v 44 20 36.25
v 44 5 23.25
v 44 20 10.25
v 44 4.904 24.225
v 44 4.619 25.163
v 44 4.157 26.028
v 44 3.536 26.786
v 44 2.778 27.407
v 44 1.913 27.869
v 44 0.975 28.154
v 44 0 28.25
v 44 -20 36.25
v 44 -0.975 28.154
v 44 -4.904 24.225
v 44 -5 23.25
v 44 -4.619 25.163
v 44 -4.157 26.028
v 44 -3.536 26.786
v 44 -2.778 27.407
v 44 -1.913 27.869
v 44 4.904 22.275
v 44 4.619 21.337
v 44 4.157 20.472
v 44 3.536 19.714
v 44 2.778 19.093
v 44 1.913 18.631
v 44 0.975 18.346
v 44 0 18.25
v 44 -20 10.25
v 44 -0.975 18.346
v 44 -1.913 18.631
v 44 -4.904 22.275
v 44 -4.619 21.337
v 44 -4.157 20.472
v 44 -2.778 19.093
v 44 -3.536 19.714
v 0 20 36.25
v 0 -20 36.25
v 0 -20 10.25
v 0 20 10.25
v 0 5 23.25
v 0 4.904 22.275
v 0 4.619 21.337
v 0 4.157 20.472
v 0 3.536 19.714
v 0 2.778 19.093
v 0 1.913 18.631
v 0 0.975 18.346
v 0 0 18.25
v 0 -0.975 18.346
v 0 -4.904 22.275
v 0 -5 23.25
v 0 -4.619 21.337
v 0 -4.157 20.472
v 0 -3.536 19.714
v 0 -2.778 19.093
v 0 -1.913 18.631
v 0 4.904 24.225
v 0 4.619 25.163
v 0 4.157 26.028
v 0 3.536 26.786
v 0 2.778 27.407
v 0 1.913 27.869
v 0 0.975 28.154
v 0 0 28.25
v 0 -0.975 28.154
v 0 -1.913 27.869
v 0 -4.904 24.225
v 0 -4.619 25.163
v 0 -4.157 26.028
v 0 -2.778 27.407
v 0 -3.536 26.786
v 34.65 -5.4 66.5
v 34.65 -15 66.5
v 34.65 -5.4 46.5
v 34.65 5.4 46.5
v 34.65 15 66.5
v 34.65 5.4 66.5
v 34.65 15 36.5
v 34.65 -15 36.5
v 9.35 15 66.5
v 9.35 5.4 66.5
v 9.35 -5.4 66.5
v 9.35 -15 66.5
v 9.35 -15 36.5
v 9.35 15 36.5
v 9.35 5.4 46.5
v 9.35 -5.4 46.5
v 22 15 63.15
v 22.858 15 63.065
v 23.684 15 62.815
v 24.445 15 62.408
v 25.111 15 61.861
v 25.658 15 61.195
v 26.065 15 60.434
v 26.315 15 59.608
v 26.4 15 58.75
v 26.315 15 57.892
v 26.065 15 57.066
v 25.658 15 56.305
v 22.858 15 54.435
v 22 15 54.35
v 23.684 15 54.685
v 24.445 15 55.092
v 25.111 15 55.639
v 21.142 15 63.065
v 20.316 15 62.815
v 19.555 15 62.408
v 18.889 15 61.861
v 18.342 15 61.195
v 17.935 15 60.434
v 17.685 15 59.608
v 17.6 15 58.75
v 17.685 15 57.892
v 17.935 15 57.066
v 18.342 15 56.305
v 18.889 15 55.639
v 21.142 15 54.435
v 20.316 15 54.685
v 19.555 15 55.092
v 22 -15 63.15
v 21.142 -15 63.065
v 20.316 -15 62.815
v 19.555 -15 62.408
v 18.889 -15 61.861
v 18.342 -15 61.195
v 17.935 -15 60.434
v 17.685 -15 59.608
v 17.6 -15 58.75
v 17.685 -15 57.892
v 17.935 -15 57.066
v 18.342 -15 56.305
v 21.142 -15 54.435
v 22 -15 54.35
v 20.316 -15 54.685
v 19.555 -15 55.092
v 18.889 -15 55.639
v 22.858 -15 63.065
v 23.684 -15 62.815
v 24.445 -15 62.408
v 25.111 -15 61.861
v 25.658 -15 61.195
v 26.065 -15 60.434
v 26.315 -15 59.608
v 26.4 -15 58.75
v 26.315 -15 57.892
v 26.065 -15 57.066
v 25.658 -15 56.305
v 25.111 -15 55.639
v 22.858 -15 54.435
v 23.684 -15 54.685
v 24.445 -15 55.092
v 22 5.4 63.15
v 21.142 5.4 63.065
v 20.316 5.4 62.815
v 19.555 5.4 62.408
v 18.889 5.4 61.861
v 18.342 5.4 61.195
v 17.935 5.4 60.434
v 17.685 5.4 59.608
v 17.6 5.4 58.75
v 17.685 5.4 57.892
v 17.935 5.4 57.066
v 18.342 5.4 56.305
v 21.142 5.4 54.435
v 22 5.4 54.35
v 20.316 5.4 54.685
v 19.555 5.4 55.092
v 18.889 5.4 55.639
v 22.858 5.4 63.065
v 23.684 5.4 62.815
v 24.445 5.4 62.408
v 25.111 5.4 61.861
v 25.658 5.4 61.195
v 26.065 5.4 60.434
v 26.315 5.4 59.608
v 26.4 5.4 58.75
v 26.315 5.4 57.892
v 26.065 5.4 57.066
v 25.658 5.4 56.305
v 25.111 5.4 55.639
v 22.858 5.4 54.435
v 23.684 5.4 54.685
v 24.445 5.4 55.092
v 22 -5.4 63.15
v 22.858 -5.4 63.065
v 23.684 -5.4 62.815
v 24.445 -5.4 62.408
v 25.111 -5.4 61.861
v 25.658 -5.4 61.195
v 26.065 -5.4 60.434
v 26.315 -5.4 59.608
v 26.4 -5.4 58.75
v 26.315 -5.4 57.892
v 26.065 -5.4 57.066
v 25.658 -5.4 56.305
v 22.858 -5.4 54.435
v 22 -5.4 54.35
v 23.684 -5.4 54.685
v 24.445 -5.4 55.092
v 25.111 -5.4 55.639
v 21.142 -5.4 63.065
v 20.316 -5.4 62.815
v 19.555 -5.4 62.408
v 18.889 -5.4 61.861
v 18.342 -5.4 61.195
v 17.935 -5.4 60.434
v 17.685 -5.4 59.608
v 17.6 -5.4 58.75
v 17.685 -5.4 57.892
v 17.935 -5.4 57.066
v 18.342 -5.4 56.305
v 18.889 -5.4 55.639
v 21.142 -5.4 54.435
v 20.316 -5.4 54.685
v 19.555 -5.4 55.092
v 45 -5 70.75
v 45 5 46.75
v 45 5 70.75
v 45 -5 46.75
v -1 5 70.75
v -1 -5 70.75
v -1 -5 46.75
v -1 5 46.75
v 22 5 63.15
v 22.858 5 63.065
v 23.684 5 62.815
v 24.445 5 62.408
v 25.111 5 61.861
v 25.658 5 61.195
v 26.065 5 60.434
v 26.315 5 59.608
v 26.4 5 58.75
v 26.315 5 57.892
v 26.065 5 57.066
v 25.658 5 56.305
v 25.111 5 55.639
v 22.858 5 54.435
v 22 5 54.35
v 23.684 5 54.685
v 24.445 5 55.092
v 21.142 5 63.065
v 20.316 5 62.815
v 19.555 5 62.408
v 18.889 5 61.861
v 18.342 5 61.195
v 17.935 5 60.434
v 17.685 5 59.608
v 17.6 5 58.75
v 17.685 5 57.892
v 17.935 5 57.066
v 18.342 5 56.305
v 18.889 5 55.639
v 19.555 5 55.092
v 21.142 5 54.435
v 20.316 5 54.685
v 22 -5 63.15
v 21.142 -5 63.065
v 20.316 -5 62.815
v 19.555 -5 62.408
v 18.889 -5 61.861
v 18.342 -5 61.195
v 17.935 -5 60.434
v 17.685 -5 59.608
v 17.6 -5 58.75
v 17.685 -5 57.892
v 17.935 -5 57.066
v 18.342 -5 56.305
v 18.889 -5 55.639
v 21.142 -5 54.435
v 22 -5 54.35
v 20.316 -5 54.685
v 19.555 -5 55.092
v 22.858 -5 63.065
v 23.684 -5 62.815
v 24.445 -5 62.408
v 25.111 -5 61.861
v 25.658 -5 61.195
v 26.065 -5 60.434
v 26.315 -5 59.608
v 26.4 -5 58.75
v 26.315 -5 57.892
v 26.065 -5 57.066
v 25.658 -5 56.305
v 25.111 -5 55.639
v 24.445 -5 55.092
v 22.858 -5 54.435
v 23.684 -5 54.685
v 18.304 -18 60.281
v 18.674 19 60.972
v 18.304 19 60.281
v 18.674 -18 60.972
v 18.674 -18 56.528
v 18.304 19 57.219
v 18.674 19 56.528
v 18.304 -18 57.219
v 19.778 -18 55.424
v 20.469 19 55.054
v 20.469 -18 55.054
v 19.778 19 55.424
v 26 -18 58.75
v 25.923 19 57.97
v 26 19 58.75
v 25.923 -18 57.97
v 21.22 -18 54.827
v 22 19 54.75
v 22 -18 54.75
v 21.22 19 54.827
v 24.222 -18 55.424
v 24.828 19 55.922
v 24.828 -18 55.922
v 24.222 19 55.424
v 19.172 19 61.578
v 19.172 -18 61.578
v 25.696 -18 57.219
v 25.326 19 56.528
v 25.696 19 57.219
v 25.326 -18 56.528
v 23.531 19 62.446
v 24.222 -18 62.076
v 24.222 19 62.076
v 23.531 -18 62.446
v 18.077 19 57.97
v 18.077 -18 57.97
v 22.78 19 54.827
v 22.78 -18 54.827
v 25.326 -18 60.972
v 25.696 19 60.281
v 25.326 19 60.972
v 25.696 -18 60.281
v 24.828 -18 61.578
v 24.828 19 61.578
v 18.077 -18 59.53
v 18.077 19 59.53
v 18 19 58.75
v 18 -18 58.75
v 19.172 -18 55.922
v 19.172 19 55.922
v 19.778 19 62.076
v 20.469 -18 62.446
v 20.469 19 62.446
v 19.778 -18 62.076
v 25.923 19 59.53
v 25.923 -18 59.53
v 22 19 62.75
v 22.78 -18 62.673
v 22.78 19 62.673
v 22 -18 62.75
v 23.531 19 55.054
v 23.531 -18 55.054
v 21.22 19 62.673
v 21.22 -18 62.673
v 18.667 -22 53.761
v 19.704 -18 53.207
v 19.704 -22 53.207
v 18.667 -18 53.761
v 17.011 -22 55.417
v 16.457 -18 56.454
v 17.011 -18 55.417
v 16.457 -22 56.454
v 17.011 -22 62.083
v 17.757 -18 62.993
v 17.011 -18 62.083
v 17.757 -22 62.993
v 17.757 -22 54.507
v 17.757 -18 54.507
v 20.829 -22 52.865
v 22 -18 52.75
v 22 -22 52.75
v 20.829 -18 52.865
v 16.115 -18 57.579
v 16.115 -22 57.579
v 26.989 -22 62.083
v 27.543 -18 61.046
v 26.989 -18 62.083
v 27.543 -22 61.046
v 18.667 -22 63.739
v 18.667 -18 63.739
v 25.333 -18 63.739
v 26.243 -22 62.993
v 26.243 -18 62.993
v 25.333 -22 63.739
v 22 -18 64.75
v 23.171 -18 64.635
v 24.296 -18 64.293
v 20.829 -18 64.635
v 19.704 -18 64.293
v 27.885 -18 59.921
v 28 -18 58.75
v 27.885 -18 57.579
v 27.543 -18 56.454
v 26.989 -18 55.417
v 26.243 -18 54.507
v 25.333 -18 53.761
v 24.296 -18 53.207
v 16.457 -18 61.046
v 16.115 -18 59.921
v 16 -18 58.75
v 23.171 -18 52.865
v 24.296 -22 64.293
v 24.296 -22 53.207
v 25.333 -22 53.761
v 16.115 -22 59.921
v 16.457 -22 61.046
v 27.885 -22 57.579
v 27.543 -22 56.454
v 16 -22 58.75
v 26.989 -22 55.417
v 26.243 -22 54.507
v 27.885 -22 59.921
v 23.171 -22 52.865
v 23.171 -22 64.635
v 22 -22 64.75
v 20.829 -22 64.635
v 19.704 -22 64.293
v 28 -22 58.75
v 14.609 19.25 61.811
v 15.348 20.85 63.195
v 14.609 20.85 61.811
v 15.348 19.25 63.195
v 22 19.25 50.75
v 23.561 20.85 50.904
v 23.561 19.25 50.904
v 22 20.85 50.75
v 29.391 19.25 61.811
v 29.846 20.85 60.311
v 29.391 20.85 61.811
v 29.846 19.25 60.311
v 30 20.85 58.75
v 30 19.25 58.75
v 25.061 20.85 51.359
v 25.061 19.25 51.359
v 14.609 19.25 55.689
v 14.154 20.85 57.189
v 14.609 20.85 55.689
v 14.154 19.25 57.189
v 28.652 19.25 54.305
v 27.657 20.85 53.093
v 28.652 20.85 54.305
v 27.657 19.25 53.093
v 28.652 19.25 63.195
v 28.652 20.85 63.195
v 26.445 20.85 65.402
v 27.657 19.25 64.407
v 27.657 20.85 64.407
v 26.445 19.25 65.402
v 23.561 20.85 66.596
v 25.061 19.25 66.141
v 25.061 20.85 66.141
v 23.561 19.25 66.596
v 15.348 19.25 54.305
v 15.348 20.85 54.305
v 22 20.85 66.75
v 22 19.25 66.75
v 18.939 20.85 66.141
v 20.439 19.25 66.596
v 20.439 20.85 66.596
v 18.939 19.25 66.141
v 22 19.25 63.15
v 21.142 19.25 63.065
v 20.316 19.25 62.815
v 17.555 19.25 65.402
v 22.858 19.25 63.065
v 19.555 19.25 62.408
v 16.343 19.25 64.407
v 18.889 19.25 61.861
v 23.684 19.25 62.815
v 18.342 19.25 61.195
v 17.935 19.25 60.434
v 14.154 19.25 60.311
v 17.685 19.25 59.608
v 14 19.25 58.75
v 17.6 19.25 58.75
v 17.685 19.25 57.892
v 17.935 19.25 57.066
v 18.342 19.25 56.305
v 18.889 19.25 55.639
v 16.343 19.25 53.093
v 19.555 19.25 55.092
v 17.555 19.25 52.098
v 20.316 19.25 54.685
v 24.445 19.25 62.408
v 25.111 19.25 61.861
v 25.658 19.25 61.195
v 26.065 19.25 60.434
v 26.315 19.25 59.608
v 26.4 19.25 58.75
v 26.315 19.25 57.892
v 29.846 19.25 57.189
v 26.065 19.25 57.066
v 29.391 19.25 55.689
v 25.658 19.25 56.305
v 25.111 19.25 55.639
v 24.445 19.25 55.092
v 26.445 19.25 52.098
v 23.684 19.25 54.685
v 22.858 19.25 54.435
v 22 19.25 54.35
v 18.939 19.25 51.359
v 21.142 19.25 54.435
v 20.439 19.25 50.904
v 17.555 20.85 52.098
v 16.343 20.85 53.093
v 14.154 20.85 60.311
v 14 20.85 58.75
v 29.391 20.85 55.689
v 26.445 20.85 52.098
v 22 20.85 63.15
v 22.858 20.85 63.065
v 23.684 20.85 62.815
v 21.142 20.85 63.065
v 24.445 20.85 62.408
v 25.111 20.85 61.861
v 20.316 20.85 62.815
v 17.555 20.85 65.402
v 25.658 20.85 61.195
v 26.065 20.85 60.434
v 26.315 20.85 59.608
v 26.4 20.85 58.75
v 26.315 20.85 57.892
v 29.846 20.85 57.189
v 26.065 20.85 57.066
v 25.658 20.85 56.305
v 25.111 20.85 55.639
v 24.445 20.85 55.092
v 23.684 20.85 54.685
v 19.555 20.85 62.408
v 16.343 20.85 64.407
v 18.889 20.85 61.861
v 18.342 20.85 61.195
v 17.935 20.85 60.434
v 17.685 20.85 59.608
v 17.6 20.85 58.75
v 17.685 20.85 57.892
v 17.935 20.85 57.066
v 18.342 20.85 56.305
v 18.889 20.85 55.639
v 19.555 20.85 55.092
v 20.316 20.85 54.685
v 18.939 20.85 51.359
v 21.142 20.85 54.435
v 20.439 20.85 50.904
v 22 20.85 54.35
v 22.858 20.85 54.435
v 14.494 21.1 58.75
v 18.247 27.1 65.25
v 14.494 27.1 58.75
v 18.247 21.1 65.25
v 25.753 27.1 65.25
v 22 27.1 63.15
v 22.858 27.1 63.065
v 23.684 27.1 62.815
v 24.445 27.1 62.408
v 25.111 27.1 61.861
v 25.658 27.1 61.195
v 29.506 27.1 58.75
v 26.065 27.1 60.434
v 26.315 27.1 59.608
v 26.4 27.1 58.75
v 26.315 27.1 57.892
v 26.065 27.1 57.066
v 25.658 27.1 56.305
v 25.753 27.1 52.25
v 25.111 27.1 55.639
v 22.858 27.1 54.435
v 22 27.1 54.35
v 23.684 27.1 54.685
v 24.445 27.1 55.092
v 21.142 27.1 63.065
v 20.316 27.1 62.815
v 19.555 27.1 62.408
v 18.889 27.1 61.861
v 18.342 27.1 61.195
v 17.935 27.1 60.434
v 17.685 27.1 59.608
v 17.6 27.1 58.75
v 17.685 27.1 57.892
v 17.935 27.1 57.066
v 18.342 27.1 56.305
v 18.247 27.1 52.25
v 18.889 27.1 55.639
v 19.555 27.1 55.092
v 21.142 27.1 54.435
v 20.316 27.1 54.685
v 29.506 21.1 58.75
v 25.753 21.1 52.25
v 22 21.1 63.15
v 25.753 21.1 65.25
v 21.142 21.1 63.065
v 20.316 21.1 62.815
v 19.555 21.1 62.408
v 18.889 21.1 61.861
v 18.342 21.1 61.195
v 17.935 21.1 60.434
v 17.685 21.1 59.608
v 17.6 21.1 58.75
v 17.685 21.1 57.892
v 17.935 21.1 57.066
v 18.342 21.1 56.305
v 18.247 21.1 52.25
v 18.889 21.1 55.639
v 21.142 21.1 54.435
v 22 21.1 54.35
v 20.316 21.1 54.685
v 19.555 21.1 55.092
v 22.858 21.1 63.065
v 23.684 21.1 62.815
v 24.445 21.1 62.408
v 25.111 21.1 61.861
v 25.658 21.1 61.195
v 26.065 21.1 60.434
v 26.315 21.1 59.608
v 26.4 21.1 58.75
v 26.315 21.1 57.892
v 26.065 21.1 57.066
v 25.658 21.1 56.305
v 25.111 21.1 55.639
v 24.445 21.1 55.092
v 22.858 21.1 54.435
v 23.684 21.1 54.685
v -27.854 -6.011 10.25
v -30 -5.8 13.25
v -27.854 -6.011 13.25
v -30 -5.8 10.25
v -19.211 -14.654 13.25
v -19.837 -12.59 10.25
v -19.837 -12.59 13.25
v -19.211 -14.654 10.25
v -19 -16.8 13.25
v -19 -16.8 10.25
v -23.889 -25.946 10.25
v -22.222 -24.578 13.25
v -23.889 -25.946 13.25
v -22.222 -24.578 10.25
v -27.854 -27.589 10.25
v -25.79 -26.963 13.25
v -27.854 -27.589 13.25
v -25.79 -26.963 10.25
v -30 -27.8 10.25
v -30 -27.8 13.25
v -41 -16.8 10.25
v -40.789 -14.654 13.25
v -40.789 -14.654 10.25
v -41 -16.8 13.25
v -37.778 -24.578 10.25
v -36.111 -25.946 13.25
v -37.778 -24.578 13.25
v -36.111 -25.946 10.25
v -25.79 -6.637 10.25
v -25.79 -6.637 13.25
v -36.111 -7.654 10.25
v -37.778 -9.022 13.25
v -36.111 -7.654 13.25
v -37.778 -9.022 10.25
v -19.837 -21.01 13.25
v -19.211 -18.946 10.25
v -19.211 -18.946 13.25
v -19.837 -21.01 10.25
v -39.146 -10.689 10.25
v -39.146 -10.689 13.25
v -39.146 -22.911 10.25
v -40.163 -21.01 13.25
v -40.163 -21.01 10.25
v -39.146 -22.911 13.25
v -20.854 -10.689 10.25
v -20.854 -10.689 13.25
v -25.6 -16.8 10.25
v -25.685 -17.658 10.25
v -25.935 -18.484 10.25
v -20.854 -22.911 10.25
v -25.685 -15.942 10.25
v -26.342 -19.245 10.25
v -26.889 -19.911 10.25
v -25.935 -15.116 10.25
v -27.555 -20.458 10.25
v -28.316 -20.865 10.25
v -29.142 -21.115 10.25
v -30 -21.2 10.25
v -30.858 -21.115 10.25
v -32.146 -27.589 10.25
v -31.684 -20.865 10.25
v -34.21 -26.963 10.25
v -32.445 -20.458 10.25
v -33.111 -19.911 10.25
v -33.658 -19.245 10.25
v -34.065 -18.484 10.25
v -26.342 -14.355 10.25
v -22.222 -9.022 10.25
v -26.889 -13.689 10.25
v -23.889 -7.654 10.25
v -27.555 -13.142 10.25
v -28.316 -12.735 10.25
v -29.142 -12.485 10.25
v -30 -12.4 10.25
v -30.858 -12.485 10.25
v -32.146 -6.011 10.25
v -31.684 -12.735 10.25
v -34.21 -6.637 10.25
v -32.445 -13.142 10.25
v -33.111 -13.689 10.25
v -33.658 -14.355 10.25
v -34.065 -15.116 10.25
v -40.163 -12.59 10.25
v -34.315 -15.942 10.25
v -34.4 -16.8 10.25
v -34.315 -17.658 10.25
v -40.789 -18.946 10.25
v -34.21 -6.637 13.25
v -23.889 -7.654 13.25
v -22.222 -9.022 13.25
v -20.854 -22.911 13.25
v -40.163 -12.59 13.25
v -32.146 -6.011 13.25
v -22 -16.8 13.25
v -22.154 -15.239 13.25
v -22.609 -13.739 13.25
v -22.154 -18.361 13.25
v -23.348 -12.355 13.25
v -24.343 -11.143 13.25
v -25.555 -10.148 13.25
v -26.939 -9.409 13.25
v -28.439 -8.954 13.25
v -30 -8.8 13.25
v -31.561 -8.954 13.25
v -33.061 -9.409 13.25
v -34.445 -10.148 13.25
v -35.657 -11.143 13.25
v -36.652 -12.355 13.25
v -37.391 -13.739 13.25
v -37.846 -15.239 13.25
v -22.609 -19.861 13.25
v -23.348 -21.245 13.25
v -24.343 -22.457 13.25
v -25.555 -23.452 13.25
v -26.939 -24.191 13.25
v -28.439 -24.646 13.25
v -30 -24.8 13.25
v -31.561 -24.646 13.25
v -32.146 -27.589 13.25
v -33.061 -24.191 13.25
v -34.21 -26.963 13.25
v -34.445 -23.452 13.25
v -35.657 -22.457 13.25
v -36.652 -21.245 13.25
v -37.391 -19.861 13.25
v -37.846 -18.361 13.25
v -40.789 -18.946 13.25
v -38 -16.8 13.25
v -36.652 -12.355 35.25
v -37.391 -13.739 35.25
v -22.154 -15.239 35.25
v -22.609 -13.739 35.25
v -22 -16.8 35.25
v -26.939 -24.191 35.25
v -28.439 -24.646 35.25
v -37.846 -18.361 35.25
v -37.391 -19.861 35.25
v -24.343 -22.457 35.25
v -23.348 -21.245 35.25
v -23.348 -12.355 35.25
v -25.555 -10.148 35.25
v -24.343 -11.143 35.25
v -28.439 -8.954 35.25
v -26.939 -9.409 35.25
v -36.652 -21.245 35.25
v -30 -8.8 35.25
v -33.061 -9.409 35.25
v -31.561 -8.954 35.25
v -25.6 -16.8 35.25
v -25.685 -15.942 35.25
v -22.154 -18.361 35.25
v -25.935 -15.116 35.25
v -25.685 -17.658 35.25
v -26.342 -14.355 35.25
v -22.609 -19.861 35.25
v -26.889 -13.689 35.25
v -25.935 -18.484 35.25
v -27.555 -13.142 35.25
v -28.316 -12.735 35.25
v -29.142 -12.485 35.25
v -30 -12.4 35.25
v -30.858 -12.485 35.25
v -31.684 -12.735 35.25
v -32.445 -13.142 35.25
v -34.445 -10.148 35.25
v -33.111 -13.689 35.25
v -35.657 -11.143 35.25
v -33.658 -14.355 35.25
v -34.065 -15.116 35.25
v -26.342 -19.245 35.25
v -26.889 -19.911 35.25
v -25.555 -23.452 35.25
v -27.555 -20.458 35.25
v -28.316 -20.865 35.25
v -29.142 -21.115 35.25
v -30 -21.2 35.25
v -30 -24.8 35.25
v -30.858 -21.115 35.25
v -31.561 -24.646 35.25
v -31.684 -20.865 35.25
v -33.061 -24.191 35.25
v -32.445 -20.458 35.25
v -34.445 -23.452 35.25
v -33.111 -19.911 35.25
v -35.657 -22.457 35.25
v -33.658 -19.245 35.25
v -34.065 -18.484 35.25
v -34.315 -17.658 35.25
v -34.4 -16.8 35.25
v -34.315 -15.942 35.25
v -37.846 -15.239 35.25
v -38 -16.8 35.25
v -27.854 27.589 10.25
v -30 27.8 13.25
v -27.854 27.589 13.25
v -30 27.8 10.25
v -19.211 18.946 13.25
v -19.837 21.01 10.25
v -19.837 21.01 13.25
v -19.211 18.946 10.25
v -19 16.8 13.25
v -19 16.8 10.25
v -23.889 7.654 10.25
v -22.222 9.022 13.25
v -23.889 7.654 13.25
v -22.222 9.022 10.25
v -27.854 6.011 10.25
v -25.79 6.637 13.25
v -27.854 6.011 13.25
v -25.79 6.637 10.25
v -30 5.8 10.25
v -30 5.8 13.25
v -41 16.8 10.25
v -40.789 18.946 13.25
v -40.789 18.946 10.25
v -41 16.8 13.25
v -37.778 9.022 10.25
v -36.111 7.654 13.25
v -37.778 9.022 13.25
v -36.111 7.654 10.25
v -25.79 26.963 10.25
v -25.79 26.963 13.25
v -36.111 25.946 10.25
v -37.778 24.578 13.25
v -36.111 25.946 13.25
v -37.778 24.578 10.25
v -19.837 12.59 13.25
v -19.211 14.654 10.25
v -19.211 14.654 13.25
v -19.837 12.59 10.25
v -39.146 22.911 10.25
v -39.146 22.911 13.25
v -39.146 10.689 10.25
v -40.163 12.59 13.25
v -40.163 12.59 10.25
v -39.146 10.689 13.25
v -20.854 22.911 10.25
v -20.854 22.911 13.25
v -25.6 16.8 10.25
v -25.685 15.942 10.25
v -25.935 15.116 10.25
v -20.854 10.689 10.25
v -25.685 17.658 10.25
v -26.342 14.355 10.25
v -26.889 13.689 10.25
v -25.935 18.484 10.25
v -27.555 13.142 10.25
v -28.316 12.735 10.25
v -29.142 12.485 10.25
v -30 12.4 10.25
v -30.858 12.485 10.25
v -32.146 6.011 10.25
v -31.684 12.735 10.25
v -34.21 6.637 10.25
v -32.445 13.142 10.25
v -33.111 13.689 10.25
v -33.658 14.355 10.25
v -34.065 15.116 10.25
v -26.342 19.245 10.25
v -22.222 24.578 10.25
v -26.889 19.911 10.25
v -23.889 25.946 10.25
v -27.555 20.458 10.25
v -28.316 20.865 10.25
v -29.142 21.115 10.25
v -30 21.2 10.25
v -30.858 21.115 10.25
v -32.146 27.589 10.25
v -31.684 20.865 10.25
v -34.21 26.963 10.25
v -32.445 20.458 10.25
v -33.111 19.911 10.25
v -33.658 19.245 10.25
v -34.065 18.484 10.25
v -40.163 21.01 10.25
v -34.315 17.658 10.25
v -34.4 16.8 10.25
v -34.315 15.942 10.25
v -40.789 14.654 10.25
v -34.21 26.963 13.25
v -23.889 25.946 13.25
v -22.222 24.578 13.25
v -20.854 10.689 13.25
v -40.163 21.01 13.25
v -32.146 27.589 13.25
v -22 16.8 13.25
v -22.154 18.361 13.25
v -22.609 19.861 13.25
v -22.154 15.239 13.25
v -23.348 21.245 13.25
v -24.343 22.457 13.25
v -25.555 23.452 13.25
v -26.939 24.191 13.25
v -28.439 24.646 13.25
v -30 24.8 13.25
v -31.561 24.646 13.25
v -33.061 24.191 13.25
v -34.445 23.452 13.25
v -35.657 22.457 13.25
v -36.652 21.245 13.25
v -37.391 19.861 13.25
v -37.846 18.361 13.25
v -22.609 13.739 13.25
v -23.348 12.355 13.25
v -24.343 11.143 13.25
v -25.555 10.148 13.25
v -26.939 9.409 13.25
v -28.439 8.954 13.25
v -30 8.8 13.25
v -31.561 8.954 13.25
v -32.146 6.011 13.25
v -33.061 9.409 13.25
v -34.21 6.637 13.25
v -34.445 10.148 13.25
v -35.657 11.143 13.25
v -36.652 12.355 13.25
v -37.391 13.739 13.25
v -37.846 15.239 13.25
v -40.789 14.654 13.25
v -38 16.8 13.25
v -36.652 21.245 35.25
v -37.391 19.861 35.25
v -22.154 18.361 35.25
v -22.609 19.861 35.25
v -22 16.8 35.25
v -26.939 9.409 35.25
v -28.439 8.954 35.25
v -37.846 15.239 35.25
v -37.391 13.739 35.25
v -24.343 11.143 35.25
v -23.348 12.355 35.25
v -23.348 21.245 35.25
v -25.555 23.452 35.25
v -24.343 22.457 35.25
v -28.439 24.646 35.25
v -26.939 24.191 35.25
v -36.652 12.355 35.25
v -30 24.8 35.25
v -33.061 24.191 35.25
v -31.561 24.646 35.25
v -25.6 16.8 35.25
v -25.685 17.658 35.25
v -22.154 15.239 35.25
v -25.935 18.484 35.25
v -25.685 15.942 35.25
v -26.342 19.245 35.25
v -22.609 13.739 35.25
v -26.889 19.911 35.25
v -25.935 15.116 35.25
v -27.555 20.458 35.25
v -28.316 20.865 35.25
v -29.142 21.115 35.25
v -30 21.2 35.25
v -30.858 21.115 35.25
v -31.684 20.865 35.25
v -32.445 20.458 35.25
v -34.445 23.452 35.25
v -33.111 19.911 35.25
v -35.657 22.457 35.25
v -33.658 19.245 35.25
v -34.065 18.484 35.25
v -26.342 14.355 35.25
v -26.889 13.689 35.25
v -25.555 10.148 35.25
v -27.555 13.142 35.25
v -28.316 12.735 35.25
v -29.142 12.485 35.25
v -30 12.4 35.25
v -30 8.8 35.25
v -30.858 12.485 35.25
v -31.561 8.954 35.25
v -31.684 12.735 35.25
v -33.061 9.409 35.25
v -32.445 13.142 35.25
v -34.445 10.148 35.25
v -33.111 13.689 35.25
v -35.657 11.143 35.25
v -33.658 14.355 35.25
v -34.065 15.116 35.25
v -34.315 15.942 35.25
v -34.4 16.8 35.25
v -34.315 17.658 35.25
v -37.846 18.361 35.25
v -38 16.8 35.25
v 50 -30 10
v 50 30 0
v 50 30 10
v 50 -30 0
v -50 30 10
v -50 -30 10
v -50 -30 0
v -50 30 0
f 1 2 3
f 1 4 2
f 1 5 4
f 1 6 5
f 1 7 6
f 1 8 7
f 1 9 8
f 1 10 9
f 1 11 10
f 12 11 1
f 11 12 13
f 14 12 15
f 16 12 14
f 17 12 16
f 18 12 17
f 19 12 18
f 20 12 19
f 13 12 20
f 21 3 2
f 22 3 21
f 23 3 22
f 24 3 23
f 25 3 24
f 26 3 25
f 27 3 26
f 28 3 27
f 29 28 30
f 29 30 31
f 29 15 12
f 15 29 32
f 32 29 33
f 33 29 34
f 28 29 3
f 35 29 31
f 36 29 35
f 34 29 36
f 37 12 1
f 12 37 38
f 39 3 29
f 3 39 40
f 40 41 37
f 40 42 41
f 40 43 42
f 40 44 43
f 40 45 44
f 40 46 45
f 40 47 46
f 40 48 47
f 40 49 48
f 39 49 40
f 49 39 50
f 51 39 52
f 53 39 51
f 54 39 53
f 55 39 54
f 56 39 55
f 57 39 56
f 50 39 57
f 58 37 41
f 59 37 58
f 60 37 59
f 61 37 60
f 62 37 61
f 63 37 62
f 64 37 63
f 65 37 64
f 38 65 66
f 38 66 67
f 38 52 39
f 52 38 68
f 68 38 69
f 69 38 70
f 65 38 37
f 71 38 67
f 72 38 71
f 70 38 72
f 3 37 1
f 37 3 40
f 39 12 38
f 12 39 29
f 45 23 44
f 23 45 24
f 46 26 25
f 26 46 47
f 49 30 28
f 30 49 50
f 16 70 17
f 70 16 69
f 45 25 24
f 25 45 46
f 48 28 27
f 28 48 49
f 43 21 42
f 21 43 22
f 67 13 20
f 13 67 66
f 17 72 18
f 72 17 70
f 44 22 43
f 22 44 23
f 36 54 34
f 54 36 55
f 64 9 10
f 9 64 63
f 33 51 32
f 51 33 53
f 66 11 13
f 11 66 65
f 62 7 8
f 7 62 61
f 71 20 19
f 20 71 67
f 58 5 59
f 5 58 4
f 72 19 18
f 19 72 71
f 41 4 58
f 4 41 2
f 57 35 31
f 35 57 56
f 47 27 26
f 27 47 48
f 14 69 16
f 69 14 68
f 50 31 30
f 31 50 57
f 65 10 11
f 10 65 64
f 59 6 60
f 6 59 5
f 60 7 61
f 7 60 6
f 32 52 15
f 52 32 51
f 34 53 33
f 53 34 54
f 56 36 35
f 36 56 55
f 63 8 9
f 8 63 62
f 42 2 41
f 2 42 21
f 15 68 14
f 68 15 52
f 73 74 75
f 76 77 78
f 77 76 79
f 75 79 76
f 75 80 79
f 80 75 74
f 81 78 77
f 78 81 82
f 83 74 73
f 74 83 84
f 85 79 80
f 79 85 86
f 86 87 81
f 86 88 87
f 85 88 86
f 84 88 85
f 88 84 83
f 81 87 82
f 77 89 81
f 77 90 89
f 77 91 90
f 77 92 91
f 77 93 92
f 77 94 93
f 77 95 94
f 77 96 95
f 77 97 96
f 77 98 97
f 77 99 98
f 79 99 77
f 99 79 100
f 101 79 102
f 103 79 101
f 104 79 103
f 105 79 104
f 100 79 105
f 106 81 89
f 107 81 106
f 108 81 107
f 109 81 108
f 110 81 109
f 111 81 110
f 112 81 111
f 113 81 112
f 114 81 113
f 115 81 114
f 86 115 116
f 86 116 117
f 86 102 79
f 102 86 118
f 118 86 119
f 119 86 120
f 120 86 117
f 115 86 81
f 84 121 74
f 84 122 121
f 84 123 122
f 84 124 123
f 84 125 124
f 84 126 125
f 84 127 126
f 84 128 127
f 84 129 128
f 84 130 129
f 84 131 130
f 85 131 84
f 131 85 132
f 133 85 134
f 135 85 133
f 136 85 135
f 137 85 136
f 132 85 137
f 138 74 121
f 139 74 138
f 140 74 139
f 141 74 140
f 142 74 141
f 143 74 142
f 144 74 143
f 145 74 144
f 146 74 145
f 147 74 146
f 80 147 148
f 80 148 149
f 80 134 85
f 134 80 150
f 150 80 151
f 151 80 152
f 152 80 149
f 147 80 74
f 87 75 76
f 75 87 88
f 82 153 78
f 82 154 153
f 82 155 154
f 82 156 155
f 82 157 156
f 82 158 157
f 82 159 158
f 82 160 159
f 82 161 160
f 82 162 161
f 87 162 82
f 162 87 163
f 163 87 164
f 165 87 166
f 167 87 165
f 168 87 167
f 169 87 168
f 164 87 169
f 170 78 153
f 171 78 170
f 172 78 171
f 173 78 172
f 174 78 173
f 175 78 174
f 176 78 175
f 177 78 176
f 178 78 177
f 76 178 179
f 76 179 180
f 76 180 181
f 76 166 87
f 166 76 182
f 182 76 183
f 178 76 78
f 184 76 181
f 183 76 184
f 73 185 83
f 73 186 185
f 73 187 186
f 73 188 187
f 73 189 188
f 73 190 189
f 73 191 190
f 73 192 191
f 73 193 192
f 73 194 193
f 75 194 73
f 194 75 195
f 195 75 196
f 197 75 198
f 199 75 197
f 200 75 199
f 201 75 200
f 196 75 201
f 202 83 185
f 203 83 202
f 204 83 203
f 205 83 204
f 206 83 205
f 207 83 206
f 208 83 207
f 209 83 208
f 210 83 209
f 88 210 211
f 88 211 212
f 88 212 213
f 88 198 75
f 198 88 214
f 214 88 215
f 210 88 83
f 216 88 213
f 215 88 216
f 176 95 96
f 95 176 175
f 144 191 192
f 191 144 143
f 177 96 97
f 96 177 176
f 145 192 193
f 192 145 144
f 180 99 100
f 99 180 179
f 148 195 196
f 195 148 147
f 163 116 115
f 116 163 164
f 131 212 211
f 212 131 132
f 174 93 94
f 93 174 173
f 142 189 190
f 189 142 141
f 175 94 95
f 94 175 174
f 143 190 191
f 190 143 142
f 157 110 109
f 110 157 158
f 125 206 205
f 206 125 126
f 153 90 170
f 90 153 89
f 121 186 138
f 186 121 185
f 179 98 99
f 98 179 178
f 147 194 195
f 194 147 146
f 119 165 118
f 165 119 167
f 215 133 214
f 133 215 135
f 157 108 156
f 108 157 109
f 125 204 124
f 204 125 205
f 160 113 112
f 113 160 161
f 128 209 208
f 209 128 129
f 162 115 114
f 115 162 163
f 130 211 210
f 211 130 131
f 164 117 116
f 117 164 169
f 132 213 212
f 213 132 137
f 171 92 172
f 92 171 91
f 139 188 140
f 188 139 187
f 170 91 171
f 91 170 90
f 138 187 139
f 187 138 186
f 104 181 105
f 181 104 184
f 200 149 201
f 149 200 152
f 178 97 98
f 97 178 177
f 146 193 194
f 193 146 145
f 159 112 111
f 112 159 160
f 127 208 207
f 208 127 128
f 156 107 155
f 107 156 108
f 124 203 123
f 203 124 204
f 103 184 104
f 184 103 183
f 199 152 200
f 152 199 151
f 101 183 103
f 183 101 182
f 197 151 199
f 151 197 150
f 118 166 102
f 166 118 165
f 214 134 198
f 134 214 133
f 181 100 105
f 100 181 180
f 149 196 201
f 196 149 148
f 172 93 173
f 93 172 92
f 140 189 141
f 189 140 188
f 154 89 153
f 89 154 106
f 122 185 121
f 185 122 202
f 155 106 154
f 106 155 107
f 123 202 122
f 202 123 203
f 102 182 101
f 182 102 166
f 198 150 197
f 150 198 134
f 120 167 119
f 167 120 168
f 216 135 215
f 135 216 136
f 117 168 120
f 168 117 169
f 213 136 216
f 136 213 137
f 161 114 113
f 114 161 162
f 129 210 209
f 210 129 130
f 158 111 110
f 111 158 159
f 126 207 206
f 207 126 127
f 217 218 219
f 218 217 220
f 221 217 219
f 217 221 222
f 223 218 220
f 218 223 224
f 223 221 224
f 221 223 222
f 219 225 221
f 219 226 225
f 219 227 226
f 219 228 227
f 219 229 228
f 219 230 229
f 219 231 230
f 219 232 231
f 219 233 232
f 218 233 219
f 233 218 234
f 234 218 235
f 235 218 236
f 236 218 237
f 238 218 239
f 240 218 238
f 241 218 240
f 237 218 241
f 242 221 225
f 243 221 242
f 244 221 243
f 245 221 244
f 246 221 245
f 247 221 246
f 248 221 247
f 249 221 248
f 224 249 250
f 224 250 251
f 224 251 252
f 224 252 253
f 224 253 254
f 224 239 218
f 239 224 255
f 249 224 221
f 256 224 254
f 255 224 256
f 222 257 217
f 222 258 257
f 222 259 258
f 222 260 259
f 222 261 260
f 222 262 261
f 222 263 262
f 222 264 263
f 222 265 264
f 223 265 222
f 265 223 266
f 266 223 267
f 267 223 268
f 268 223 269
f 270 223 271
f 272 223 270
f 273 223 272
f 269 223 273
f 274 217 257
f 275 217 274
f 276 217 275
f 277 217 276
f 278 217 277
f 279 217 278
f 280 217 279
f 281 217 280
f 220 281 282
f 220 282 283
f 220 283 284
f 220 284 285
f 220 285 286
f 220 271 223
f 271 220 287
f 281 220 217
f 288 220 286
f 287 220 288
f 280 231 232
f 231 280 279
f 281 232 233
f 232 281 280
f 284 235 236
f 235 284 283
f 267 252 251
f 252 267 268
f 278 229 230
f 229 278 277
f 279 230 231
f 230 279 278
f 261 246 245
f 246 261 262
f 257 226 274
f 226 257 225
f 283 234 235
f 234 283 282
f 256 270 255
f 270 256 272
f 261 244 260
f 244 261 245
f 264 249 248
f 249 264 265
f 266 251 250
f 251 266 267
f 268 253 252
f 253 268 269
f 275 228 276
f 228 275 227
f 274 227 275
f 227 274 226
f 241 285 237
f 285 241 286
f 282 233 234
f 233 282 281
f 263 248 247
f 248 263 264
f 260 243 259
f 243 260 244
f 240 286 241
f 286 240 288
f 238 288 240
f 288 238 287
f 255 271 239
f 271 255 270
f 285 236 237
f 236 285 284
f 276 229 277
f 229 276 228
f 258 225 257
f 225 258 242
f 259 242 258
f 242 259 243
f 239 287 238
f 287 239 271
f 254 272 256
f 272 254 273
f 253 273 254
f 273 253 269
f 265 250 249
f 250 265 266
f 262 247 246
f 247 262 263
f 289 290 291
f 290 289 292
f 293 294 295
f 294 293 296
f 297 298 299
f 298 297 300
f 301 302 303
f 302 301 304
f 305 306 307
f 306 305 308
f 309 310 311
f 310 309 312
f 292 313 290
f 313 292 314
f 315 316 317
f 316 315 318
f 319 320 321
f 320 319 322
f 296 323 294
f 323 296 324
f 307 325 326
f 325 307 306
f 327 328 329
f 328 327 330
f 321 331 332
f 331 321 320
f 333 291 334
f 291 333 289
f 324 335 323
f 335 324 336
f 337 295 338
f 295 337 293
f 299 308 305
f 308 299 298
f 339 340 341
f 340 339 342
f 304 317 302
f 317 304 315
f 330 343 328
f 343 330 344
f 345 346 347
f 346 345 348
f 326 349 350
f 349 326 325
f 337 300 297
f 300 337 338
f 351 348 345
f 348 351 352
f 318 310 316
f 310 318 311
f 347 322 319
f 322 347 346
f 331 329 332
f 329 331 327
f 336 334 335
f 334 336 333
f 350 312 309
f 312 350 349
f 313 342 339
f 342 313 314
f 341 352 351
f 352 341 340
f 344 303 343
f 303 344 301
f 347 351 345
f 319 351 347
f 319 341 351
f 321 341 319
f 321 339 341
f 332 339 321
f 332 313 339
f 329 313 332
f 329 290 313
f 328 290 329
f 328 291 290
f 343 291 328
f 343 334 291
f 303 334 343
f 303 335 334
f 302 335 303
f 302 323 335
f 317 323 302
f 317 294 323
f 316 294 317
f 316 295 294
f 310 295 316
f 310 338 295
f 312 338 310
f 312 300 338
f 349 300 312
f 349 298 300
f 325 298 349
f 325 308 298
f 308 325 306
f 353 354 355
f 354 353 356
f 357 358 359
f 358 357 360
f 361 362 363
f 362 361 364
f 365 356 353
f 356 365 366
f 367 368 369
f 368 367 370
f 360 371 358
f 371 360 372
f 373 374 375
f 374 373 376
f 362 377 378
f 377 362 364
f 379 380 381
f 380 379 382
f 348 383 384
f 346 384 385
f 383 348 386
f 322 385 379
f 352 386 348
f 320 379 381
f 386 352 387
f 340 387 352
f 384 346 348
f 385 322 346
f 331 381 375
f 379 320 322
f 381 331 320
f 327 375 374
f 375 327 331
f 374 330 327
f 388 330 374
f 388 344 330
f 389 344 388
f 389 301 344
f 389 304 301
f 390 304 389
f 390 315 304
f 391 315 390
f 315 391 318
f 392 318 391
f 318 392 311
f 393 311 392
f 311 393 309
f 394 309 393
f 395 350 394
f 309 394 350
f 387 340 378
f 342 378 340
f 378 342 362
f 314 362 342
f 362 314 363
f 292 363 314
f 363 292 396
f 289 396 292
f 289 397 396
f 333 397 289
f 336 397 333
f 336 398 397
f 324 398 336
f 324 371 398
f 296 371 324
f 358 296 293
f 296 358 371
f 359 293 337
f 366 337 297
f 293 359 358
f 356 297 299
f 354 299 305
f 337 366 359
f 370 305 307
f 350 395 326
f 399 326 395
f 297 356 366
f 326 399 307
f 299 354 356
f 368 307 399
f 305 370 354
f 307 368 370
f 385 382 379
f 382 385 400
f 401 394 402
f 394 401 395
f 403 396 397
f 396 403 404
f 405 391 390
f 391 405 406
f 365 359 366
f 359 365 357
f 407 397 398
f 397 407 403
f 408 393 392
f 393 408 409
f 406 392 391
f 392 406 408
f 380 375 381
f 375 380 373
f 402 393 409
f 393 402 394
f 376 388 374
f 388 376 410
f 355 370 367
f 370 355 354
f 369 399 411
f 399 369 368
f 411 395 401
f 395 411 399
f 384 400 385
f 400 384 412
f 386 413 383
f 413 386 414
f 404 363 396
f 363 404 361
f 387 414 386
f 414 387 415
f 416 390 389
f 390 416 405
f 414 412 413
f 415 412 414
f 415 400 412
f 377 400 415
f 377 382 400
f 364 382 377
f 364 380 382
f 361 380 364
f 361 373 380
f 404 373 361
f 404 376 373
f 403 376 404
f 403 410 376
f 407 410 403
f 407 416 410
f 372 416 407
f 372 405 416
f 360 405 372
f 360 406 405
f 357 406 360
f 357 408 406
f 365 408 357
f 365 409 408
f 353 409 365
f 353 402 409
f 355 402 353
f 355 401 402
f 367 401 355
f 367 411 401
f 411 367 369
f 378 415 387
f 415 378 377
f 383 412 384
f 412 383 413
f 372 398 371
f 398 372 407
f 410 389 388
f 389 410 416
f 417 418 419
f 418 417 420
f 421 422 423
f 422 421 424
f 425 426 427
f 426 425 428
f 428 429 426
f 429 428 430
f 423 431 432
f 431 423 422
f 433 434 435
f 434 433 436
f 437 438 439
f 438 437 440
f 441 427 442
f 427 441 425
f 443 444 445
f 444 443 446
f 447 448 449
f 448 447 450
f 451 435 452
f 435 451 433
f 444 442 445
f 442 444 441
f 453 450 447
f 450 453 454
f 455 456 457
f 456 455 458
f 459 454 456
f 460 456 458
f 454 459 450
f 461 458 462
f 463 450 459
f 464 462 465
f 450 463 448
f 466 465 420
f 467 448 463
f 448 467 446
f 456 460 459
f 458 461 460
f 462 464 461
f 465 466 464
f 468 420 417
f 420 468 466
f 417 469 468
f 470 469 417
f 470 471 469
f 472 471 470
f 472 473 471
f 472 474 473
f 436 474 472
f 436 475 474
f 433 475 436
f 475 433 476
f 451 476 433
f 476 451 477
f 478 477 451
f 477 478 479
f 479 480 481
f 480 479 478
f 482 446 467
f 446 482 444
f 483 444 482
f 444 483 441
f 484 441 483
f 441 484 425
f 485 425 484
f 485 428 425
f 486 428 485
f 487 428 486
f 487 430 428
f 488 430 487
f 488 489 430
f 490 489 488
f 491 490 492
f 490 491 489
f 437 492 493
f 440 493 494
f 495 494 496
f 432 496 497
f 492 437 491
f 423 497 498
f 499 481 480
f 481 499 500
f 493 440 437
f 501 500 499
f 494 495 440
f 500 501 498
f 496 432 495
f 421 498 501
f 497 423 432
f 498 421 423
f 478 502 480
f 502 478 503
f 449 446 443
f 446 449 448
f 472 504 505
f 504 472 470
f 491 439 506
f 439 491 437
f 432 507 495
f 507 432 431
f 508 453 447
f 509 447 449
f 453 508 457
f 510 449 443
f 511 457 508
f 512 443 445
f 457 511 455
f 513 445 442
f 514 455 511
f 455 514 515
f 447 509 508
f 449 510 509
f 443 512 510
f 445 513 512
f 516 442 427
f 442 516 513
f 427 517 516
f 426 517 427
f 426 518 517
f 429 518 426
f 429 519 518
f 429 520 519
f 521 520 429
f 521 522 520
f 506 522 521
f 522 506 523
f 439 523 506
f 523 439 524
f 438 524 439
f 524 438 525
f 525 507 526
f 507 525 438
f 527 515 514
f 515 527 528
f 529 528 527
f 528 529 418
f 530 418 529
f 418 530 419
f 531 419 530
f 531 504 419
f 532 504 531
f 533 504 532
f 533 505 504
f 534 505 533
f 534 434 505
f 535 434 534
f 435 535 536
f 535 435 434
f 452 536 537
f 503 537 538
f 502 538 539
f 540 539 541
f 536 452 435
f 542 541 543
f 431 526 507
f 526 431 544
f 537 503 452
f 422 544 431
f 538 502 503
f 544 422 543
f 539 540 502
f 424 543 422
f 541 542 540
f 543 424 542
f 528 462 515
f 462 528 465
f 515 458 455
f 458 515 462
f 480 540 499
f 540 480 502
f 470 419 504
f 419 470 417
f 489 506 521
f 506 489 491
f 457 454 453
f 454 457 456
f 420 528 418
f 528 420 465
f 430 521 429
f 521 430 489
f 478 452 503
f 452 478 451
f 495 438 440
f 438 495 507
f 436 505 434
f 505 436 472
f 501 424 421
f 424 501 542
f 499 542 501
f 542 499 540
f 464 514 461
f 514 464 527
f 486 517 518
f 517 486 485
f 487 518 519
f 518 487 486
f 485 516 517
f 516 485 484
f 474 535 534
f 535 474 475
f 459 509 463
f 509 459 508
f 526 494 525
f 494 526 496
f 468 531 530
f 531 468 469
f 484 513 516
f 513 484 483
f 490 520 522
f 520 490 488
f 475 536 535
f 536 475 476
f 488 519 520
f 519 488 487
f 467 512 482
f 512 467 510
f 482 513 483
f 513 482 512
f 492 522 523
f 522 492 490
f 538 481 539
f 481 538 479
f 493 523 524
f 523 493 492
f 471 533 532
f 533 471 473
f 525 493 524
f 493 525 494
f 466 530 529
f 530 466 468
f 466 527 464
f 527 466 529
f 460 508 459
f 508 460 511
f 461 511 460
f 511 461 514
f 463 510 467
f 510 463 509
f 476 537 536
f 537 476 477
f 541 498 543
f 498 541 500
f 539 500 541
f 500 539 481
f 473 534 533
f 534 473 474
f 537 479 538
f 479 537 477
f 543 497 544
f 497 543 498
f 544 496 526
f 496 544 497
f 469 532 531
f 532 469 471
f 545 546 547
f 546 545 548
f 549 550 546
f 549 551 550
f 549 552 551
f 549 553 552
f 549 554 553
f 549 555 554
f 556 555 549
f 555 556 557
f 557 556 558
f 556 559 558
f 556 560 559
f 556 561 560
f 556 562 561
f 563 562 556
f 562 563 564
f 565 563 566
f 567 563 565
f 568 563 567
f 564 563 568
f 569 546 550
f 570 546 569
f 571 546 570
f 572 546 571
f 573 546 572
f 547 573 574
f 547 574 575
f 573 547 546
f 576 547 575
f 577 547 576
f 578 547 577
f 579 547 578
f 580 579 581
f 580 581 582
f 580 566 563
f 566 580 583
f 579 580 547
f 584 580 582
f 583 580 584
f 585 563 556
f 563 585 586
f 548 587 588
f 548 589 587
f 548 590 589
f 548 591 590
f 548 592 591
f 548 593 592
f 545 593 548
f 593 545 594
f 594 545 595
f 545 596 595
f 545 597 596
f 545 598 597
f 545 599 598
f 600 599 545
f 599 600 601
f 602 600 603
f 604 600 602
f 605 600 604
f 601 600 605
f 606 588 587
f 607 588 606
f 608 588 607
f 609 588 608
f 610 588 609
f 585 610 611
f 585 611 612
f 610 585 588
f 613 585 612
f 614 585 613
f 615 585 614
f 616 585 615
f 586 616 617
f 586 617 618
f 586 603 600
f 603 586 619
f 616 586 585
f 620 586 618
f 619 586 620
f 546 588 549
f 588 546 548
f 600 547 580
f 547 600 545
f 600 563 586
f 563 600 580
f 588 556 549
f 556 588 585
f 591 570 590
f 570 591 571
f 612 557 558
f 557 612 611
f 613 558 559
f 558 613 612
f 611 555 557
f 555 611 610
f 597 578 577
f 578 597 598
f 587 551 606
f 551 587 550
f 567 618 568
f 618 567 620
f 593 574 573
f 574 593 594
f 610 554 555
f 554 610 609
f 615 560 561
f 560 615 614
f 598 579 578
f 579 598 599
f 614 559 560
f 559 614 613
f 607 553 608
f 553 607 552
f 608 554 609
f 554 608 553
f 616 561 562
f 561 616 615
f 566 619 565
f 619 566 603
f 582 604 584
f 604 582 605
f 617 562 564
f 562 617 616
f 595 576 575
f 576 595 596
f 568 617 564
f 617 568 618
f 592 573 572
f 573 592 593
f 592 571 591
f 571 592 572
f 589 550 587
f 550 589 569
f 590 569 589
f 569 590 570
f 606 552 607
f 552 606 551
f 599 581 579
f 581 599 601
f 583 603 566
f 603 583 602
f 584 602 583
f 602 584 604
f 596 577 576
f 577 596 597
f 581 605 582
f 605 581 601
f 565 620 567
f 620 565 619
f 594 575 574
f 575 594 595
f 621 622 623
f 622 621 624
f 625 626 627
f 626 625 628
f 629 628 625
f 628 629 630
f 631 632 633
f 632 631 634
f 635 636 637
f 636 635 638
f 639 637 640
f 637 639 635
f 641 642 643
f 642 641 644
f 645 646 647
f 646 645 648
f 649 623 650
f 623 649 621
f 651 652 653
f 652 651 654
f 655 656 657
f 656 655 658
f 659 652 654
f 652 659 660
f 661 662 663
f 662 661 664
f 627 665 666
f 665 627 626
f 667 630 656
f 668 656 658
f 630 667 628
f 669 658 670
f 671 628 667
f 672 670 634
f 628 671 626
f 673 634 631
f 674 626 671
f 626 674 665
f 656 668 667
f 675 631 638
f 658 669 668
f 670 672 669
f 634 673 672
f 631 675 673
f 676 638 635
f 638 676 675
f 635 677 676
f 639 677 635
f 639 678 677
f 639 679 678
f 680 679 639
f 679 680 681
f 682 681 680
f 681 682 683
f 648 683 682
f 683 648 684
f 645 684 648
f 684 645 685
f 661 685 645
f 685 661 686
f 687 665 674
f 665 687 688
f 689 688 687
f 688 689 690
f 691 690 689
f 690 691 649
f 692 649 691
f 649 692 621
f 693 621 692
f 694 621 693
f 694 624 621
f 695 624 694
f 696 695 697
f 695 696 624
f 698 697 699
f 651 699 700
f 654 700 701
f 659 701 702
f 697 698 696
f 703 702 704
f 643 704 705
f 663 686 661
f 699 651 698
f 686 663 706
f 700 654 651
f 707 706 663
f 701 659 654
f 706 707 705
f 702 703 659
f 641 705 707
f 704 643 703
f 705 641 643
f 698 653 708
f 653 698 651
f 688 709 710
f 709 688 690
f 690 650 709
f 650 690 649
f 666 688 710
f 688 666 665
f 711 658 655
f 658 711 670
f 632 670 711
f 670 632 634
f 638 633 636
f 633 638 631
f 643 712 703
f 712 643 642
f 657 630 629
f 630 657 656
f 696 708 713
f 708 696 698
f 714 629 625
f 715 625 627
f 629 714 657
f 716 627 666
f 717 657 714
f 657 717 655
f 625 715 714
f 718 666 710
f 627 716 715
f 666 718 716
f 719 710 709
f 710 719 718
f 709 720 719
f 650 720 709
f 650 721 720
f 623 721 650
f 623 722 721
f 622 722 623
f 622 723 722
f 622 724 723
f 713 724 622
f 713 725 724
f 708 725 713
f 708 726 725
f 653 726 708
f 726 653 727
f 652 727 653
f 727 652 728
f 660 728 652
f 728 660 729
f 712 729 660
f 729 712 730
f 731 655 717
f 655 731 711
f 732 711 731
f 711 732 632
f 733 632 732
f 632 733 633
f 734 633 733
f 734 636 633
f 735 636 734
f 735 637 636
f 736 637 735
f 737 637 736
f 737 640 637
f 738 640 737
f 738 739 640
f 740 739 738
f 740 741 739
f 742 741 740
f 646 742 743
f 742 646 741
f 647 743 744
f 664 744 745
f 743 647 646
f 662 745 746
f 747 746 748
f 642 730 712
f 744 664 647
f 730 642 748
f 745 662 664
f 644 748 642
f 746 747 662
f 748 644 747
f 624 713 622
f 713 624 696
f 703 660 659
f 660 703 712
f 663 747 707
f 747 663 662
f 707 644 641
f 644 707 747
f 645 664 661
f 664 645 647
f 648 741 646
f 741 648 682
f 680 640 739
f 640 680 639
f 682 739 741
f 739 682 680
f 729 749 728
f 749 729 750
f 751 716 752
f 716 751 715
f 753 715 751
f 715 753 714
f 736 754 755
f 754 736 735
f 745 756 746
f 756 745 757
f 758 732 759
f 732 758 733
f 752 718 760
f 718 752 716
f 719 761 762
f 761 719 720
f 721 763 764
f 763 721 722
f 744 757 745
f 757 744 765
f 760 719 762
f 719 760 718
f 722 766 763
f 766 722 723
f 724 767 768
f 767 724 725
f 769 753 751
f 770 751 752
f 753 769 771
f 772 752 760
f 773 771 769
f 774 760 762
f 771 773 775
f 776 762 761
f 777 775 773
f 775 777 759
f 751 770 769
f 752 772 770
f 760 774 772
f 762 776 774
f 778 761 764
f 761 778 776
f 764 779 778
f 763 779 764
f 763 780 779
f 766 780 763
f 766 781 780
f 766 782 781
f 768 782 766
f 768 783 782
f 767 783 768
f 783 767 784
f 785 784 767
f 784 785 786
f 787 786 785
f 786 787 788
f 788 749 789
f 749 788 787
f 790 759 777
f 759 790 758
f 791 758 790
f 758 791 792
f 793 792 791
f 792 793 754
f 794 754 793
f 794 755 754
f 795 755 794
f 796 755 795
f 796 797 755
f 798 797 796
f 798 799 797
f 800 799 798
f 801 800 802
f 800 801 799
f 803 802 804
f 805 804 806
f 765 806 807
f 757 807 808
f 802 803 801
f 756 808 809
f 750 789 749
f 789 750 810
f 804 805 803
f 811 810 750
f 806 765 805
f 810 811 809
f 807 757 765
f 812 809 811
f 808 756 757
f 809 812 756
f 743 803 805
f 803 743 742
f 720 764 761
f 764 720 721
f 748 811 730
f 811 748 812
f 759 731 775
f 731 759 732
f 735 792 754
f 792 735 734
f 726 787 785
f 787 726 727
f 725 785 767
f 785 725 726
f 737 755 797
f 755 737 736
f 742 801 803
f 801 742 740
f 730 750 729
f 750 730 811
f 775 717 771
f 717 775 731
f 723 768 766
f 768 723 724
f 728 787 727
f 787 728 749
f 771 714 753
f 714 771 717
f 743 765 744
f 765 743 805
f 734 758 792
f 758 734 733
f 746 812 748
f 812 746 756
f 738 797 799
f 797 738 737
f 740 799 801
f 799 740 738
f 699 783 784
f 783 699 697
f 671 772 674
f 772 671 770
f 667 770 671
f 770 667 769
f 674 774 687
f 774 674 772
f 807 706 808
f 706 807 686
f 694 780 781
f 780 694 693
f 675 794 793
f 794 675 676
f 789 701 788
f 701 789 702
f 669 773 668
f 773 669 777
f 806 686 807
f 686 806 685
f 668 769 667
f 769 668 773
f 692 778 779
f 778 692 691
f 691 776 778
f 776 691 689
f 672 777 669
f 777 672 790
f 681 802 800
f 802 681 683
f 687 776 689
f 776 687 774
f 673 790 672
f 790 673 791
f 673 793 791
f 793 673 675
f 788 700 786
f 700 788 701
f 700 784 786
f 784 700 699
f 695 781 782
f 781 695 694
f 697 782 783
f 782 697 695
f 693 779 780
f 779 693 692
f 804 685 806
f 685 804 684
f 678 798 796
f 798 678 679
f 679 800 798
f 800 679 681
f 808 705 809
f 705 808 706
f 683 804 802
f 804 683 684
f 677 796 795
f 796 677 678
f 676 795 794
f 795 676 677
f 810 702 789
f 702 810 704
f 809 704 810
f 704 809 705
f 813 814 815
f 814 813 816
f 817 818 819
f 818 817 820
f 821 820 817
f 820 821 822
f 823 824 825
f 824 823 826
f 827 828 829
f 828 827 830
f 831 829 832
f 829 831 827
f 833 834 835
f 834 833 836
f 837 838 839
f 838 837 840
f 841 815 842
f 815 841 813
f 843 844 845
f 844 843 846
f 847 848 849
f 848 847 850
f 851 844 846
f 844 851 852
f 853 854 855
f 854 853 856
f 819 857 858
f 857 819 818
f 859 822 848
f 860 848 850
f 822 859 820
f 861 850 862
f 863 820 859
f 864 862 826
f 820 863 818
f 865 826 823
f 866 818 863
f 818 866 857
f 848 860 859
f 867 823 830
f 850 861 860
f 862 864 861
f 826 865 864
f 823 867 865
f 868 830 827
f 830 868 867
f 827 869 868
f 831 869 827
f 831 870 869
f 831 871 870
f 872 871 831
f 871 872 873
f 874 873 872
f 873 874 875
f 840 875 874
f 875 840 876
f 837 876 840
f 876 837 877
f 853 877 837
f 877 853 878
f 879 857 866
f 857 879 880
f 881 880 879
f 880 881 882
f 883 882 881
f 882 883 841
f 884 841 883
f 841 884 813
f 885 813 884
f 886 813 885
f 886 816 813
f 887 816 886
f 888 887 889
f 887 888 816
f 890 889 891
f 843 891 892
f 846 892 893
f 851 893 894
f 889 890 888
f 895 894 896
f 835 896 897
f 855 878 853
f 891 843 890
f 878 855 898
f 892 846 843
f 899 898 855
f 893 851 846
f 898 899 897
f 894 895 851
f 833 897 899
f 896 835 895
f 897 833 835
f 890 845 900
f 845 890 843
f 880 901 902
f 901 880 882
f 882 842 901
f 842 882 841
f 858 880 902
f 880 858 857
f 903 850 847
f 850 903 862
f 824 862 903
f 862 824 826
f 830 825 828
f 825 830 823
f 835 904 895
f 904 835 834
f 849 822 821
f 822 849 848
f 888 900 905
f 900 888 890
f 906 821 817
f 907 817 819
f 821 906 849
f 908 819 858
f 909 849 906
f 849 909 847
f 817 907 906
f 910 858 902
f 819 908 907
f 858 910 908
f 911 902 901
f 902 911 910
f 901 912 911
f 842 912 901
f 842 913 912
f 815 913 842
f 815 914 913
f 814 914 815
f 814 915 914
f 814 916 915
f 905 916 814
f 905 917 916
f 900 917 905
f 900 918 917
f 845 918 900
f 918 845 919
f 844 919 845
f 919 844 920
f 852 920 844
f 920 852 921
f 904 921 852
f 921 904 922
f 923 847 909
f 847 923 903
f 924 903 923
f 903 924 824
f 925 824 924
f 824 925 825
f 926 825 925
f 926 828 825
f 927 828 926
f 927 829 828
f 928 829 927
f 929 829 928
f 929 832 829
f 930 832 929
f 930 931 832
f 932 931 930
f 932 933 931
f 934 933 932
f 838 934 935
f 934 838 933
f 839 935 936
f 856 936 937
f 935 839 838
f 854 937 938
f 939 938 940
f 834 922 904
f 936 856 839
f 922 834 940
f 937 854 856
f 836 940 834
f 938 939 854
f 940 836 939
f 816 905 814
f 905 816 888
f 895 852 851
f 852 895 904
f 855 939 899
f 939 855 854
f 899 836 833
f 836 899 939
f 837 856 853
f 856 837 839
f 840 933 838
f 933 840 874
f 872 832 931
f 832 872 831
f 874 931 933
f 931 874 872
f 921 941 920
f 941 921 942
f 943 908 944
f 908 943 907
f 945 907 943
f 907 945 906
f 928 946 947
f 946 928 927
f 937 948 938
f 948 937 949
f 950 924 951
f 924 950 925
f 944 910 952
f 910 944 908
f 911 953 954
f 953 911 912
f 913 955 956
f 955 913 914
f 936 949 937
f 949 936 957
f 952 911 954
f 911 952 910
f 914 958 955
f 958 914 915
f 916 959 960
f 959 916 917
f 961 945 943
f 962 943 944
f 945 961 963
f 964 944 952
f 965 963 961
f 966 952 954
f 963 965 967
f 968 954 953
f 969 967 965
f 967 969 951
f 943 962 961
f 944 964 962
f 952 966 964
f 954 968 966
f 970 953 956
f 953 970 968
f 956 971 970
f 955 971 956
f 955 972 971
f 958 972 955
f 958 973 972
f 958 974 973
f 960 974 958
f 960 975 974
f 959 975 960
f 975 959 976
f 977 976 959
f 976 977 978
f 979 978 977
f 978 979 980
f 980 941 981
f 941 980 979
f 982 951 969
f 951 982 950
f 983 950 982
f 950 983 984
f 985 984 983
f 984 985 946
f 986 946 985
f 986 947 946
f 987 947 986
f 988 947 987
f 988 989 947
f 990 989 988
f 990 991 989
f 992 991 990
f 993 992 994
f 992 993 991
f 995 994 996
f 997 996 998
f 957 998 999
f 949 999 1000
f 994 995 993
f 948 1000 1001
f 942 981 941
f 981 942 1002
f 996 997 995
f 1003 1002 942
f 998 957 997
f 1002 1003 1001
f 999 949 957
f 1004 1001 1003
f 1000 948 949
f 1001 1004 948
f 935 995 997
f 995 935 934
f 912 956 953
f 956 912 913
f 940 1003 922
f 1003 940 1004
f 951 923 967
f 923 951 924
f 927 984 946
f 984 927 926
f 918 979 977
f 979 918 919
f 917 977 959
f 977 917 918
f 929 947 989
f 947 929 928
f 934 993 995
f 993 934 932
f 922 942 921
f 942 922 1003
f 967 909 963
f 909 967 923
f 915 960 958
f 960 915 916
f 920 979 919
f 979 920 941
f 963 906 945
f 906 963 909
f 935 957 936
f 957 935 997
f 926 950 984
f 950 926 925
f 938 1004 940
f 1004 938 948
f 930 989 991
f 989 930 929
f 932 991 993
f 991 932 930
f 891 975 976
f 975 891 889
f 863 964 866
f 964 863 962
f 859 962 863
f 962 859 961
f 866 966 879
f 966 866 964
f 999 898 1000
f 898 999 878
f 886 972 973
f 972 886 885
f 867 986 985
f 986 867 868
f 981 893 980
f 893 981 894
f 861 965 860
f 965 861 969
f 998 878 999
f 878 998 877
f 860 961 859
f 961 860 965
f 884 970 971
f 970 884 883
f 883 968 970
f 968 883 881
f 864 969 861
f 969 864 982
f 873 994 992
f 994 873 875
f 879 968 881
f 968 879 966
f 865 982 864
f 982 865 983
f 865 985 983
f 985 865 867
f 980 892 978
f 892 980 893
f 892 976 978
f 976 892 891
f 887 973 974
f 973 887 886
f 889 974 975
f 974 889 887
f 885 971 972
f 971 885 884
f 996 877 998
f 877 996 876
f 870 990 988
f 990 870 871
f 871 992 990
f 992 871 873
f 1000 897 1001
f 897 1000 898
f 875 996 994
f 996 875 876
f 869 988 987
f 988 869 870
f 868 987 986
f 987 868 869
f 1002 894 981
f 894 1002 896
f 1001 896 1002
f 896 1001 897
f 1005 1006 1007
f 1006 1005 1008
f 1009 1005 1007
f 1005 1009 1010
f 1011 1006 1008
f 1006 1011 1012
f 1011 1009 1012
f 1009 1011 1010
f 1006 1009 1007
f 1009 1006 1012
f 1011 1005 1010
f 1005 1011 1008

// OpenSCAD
$fn = 32;

// ------------------------------------------------------------------------
// Indexing jig: plate 100 x 60 mm, pin d8
// Every part is its own module, assembly() places every instance.
// ------------------------------------------------------------------------

// --- part 1 ---
module jig_plate() {
  difference() {
    translate([-50, -30, 0]) cube([100, 60, 10]);
  }
}

// --- part 2 ---
module locator_block() {
  difference() {
    translate([-22, -20, 0]) cube([44, 40, 26]);
    translate([0, 0, 13]) rotate([0, 90, 0]) cylinder(h = 46, d = 10, center = true);
  }
}

// --- part 3 ---
module index_fork() {
  difference() {
    translate([-12.65, -15, 0]) cube([25.3, 30, 30]);
    translate([-13.65, -5.4, 10]) cube([27.3, 10.8, 21]);
    translate([0, 0, 22.25]) rotate([90, 0, 0]) cylinder(h = 32, d = 8.8, center = true);
  }
}

// --- part 4 ---
module index_arm() {
  difference() {
    translate([-23, -5, 0]) cube([46, 10, 24]);
    translate([0, 0, 12]) rotate([90, 0, 0]) cylinder(h = 12, d = 8.8, center = true);
  }
}

// --- part 5 ---
module index_pin() {
  rotate([0, 90, 0]) cylinder(h = 38, d = 8, center = true);
  translate([-22, 0, 0]) rotate([0, 90, 0]) cylinder(h = 4, d = 12);
}

// --- part 6 ---
module pin_washer() {
  difference() {
      translate([0, 0, 0]) cylinder(h = 1.6, d = 16);
      translate([0, 0, -1]) cylinder(h = 3.6, d = 8.8);
    }
}

// --- part 7 ---
module lock_nut() {
  difference() {
    linear_extrude(height = 6) polygon(points = [[7.506, 0], [3.753, 6.5], [-3.753, 6.5], [-7.506, 0], [-3.753, -6.5], [3.753, -6.5]]);
    translate([0, 0, -1]) cylinder(h = 8, d = 8.8);
  }
}

// --- part 8 ---
module guide_bush_a() {
  difference() {
    union() {
      cylinder(h = 3, d = 22);
      translate([0, 0, 3]) cylinder(h = 22, d = 16);
    }
    translate([0, 0, -1]) cylinder(h = 27, d = 8.8);
  }
}

// --- part 9 ---
module guide_bush_b() {
  difference() {
    union() {
      cylinder(h = 3, d = 22);
      translate([0, 0, 3]) cylinder(h = 22, d = 16);
    }
    translate([0, 0, -1]) cylinder(h = 27, d = 8.8);
  }
}

// --- assembly ---
module assembly() {
  color([0.80, 0.24, 0.20]) translate([0, 0, 0]) rotate([0, 0, 0]) jig_plate();
  color([0.20, 0.45, 0.75]) translate([22, 0, 10.25]) rotate([0, 0, 0]) locator_block();
  color([0.25, 0.62, 0.32]) translate([22, 0, 36.5]) rotate([0, 0, 0]) index_fork();
  color([0.92, 0.70, 0.18]) translate([22, 0, 46.75]) rotate([0, 0, 0]) index_arm();
  color([0.58, 0.35, 0.70]) translate([22, 0, 58.75]) rotate([0, 0, 90]) index_pin();
  color([0.16, 0.66, 0.66]) translate([22, 20.85, 58.75]) rotate([90, 0, 0]) pin_washer();
  color([0.85, 0.48, 0.18]) translate([22, 27.1, 58.75]) rotate([90, 0, 0]) lock_nut();
  color([0.55, 0.60, 0.65]) translate([-30, -16.8, 10.25]) rotate([0, 0, 0]) guide_bush_a();
  color([0.75, 0.30, 0.55]) translate([-30, 16.8, 10.25]) rotate([0, 0, 0]) guide_bush_b();
}

assembly();
